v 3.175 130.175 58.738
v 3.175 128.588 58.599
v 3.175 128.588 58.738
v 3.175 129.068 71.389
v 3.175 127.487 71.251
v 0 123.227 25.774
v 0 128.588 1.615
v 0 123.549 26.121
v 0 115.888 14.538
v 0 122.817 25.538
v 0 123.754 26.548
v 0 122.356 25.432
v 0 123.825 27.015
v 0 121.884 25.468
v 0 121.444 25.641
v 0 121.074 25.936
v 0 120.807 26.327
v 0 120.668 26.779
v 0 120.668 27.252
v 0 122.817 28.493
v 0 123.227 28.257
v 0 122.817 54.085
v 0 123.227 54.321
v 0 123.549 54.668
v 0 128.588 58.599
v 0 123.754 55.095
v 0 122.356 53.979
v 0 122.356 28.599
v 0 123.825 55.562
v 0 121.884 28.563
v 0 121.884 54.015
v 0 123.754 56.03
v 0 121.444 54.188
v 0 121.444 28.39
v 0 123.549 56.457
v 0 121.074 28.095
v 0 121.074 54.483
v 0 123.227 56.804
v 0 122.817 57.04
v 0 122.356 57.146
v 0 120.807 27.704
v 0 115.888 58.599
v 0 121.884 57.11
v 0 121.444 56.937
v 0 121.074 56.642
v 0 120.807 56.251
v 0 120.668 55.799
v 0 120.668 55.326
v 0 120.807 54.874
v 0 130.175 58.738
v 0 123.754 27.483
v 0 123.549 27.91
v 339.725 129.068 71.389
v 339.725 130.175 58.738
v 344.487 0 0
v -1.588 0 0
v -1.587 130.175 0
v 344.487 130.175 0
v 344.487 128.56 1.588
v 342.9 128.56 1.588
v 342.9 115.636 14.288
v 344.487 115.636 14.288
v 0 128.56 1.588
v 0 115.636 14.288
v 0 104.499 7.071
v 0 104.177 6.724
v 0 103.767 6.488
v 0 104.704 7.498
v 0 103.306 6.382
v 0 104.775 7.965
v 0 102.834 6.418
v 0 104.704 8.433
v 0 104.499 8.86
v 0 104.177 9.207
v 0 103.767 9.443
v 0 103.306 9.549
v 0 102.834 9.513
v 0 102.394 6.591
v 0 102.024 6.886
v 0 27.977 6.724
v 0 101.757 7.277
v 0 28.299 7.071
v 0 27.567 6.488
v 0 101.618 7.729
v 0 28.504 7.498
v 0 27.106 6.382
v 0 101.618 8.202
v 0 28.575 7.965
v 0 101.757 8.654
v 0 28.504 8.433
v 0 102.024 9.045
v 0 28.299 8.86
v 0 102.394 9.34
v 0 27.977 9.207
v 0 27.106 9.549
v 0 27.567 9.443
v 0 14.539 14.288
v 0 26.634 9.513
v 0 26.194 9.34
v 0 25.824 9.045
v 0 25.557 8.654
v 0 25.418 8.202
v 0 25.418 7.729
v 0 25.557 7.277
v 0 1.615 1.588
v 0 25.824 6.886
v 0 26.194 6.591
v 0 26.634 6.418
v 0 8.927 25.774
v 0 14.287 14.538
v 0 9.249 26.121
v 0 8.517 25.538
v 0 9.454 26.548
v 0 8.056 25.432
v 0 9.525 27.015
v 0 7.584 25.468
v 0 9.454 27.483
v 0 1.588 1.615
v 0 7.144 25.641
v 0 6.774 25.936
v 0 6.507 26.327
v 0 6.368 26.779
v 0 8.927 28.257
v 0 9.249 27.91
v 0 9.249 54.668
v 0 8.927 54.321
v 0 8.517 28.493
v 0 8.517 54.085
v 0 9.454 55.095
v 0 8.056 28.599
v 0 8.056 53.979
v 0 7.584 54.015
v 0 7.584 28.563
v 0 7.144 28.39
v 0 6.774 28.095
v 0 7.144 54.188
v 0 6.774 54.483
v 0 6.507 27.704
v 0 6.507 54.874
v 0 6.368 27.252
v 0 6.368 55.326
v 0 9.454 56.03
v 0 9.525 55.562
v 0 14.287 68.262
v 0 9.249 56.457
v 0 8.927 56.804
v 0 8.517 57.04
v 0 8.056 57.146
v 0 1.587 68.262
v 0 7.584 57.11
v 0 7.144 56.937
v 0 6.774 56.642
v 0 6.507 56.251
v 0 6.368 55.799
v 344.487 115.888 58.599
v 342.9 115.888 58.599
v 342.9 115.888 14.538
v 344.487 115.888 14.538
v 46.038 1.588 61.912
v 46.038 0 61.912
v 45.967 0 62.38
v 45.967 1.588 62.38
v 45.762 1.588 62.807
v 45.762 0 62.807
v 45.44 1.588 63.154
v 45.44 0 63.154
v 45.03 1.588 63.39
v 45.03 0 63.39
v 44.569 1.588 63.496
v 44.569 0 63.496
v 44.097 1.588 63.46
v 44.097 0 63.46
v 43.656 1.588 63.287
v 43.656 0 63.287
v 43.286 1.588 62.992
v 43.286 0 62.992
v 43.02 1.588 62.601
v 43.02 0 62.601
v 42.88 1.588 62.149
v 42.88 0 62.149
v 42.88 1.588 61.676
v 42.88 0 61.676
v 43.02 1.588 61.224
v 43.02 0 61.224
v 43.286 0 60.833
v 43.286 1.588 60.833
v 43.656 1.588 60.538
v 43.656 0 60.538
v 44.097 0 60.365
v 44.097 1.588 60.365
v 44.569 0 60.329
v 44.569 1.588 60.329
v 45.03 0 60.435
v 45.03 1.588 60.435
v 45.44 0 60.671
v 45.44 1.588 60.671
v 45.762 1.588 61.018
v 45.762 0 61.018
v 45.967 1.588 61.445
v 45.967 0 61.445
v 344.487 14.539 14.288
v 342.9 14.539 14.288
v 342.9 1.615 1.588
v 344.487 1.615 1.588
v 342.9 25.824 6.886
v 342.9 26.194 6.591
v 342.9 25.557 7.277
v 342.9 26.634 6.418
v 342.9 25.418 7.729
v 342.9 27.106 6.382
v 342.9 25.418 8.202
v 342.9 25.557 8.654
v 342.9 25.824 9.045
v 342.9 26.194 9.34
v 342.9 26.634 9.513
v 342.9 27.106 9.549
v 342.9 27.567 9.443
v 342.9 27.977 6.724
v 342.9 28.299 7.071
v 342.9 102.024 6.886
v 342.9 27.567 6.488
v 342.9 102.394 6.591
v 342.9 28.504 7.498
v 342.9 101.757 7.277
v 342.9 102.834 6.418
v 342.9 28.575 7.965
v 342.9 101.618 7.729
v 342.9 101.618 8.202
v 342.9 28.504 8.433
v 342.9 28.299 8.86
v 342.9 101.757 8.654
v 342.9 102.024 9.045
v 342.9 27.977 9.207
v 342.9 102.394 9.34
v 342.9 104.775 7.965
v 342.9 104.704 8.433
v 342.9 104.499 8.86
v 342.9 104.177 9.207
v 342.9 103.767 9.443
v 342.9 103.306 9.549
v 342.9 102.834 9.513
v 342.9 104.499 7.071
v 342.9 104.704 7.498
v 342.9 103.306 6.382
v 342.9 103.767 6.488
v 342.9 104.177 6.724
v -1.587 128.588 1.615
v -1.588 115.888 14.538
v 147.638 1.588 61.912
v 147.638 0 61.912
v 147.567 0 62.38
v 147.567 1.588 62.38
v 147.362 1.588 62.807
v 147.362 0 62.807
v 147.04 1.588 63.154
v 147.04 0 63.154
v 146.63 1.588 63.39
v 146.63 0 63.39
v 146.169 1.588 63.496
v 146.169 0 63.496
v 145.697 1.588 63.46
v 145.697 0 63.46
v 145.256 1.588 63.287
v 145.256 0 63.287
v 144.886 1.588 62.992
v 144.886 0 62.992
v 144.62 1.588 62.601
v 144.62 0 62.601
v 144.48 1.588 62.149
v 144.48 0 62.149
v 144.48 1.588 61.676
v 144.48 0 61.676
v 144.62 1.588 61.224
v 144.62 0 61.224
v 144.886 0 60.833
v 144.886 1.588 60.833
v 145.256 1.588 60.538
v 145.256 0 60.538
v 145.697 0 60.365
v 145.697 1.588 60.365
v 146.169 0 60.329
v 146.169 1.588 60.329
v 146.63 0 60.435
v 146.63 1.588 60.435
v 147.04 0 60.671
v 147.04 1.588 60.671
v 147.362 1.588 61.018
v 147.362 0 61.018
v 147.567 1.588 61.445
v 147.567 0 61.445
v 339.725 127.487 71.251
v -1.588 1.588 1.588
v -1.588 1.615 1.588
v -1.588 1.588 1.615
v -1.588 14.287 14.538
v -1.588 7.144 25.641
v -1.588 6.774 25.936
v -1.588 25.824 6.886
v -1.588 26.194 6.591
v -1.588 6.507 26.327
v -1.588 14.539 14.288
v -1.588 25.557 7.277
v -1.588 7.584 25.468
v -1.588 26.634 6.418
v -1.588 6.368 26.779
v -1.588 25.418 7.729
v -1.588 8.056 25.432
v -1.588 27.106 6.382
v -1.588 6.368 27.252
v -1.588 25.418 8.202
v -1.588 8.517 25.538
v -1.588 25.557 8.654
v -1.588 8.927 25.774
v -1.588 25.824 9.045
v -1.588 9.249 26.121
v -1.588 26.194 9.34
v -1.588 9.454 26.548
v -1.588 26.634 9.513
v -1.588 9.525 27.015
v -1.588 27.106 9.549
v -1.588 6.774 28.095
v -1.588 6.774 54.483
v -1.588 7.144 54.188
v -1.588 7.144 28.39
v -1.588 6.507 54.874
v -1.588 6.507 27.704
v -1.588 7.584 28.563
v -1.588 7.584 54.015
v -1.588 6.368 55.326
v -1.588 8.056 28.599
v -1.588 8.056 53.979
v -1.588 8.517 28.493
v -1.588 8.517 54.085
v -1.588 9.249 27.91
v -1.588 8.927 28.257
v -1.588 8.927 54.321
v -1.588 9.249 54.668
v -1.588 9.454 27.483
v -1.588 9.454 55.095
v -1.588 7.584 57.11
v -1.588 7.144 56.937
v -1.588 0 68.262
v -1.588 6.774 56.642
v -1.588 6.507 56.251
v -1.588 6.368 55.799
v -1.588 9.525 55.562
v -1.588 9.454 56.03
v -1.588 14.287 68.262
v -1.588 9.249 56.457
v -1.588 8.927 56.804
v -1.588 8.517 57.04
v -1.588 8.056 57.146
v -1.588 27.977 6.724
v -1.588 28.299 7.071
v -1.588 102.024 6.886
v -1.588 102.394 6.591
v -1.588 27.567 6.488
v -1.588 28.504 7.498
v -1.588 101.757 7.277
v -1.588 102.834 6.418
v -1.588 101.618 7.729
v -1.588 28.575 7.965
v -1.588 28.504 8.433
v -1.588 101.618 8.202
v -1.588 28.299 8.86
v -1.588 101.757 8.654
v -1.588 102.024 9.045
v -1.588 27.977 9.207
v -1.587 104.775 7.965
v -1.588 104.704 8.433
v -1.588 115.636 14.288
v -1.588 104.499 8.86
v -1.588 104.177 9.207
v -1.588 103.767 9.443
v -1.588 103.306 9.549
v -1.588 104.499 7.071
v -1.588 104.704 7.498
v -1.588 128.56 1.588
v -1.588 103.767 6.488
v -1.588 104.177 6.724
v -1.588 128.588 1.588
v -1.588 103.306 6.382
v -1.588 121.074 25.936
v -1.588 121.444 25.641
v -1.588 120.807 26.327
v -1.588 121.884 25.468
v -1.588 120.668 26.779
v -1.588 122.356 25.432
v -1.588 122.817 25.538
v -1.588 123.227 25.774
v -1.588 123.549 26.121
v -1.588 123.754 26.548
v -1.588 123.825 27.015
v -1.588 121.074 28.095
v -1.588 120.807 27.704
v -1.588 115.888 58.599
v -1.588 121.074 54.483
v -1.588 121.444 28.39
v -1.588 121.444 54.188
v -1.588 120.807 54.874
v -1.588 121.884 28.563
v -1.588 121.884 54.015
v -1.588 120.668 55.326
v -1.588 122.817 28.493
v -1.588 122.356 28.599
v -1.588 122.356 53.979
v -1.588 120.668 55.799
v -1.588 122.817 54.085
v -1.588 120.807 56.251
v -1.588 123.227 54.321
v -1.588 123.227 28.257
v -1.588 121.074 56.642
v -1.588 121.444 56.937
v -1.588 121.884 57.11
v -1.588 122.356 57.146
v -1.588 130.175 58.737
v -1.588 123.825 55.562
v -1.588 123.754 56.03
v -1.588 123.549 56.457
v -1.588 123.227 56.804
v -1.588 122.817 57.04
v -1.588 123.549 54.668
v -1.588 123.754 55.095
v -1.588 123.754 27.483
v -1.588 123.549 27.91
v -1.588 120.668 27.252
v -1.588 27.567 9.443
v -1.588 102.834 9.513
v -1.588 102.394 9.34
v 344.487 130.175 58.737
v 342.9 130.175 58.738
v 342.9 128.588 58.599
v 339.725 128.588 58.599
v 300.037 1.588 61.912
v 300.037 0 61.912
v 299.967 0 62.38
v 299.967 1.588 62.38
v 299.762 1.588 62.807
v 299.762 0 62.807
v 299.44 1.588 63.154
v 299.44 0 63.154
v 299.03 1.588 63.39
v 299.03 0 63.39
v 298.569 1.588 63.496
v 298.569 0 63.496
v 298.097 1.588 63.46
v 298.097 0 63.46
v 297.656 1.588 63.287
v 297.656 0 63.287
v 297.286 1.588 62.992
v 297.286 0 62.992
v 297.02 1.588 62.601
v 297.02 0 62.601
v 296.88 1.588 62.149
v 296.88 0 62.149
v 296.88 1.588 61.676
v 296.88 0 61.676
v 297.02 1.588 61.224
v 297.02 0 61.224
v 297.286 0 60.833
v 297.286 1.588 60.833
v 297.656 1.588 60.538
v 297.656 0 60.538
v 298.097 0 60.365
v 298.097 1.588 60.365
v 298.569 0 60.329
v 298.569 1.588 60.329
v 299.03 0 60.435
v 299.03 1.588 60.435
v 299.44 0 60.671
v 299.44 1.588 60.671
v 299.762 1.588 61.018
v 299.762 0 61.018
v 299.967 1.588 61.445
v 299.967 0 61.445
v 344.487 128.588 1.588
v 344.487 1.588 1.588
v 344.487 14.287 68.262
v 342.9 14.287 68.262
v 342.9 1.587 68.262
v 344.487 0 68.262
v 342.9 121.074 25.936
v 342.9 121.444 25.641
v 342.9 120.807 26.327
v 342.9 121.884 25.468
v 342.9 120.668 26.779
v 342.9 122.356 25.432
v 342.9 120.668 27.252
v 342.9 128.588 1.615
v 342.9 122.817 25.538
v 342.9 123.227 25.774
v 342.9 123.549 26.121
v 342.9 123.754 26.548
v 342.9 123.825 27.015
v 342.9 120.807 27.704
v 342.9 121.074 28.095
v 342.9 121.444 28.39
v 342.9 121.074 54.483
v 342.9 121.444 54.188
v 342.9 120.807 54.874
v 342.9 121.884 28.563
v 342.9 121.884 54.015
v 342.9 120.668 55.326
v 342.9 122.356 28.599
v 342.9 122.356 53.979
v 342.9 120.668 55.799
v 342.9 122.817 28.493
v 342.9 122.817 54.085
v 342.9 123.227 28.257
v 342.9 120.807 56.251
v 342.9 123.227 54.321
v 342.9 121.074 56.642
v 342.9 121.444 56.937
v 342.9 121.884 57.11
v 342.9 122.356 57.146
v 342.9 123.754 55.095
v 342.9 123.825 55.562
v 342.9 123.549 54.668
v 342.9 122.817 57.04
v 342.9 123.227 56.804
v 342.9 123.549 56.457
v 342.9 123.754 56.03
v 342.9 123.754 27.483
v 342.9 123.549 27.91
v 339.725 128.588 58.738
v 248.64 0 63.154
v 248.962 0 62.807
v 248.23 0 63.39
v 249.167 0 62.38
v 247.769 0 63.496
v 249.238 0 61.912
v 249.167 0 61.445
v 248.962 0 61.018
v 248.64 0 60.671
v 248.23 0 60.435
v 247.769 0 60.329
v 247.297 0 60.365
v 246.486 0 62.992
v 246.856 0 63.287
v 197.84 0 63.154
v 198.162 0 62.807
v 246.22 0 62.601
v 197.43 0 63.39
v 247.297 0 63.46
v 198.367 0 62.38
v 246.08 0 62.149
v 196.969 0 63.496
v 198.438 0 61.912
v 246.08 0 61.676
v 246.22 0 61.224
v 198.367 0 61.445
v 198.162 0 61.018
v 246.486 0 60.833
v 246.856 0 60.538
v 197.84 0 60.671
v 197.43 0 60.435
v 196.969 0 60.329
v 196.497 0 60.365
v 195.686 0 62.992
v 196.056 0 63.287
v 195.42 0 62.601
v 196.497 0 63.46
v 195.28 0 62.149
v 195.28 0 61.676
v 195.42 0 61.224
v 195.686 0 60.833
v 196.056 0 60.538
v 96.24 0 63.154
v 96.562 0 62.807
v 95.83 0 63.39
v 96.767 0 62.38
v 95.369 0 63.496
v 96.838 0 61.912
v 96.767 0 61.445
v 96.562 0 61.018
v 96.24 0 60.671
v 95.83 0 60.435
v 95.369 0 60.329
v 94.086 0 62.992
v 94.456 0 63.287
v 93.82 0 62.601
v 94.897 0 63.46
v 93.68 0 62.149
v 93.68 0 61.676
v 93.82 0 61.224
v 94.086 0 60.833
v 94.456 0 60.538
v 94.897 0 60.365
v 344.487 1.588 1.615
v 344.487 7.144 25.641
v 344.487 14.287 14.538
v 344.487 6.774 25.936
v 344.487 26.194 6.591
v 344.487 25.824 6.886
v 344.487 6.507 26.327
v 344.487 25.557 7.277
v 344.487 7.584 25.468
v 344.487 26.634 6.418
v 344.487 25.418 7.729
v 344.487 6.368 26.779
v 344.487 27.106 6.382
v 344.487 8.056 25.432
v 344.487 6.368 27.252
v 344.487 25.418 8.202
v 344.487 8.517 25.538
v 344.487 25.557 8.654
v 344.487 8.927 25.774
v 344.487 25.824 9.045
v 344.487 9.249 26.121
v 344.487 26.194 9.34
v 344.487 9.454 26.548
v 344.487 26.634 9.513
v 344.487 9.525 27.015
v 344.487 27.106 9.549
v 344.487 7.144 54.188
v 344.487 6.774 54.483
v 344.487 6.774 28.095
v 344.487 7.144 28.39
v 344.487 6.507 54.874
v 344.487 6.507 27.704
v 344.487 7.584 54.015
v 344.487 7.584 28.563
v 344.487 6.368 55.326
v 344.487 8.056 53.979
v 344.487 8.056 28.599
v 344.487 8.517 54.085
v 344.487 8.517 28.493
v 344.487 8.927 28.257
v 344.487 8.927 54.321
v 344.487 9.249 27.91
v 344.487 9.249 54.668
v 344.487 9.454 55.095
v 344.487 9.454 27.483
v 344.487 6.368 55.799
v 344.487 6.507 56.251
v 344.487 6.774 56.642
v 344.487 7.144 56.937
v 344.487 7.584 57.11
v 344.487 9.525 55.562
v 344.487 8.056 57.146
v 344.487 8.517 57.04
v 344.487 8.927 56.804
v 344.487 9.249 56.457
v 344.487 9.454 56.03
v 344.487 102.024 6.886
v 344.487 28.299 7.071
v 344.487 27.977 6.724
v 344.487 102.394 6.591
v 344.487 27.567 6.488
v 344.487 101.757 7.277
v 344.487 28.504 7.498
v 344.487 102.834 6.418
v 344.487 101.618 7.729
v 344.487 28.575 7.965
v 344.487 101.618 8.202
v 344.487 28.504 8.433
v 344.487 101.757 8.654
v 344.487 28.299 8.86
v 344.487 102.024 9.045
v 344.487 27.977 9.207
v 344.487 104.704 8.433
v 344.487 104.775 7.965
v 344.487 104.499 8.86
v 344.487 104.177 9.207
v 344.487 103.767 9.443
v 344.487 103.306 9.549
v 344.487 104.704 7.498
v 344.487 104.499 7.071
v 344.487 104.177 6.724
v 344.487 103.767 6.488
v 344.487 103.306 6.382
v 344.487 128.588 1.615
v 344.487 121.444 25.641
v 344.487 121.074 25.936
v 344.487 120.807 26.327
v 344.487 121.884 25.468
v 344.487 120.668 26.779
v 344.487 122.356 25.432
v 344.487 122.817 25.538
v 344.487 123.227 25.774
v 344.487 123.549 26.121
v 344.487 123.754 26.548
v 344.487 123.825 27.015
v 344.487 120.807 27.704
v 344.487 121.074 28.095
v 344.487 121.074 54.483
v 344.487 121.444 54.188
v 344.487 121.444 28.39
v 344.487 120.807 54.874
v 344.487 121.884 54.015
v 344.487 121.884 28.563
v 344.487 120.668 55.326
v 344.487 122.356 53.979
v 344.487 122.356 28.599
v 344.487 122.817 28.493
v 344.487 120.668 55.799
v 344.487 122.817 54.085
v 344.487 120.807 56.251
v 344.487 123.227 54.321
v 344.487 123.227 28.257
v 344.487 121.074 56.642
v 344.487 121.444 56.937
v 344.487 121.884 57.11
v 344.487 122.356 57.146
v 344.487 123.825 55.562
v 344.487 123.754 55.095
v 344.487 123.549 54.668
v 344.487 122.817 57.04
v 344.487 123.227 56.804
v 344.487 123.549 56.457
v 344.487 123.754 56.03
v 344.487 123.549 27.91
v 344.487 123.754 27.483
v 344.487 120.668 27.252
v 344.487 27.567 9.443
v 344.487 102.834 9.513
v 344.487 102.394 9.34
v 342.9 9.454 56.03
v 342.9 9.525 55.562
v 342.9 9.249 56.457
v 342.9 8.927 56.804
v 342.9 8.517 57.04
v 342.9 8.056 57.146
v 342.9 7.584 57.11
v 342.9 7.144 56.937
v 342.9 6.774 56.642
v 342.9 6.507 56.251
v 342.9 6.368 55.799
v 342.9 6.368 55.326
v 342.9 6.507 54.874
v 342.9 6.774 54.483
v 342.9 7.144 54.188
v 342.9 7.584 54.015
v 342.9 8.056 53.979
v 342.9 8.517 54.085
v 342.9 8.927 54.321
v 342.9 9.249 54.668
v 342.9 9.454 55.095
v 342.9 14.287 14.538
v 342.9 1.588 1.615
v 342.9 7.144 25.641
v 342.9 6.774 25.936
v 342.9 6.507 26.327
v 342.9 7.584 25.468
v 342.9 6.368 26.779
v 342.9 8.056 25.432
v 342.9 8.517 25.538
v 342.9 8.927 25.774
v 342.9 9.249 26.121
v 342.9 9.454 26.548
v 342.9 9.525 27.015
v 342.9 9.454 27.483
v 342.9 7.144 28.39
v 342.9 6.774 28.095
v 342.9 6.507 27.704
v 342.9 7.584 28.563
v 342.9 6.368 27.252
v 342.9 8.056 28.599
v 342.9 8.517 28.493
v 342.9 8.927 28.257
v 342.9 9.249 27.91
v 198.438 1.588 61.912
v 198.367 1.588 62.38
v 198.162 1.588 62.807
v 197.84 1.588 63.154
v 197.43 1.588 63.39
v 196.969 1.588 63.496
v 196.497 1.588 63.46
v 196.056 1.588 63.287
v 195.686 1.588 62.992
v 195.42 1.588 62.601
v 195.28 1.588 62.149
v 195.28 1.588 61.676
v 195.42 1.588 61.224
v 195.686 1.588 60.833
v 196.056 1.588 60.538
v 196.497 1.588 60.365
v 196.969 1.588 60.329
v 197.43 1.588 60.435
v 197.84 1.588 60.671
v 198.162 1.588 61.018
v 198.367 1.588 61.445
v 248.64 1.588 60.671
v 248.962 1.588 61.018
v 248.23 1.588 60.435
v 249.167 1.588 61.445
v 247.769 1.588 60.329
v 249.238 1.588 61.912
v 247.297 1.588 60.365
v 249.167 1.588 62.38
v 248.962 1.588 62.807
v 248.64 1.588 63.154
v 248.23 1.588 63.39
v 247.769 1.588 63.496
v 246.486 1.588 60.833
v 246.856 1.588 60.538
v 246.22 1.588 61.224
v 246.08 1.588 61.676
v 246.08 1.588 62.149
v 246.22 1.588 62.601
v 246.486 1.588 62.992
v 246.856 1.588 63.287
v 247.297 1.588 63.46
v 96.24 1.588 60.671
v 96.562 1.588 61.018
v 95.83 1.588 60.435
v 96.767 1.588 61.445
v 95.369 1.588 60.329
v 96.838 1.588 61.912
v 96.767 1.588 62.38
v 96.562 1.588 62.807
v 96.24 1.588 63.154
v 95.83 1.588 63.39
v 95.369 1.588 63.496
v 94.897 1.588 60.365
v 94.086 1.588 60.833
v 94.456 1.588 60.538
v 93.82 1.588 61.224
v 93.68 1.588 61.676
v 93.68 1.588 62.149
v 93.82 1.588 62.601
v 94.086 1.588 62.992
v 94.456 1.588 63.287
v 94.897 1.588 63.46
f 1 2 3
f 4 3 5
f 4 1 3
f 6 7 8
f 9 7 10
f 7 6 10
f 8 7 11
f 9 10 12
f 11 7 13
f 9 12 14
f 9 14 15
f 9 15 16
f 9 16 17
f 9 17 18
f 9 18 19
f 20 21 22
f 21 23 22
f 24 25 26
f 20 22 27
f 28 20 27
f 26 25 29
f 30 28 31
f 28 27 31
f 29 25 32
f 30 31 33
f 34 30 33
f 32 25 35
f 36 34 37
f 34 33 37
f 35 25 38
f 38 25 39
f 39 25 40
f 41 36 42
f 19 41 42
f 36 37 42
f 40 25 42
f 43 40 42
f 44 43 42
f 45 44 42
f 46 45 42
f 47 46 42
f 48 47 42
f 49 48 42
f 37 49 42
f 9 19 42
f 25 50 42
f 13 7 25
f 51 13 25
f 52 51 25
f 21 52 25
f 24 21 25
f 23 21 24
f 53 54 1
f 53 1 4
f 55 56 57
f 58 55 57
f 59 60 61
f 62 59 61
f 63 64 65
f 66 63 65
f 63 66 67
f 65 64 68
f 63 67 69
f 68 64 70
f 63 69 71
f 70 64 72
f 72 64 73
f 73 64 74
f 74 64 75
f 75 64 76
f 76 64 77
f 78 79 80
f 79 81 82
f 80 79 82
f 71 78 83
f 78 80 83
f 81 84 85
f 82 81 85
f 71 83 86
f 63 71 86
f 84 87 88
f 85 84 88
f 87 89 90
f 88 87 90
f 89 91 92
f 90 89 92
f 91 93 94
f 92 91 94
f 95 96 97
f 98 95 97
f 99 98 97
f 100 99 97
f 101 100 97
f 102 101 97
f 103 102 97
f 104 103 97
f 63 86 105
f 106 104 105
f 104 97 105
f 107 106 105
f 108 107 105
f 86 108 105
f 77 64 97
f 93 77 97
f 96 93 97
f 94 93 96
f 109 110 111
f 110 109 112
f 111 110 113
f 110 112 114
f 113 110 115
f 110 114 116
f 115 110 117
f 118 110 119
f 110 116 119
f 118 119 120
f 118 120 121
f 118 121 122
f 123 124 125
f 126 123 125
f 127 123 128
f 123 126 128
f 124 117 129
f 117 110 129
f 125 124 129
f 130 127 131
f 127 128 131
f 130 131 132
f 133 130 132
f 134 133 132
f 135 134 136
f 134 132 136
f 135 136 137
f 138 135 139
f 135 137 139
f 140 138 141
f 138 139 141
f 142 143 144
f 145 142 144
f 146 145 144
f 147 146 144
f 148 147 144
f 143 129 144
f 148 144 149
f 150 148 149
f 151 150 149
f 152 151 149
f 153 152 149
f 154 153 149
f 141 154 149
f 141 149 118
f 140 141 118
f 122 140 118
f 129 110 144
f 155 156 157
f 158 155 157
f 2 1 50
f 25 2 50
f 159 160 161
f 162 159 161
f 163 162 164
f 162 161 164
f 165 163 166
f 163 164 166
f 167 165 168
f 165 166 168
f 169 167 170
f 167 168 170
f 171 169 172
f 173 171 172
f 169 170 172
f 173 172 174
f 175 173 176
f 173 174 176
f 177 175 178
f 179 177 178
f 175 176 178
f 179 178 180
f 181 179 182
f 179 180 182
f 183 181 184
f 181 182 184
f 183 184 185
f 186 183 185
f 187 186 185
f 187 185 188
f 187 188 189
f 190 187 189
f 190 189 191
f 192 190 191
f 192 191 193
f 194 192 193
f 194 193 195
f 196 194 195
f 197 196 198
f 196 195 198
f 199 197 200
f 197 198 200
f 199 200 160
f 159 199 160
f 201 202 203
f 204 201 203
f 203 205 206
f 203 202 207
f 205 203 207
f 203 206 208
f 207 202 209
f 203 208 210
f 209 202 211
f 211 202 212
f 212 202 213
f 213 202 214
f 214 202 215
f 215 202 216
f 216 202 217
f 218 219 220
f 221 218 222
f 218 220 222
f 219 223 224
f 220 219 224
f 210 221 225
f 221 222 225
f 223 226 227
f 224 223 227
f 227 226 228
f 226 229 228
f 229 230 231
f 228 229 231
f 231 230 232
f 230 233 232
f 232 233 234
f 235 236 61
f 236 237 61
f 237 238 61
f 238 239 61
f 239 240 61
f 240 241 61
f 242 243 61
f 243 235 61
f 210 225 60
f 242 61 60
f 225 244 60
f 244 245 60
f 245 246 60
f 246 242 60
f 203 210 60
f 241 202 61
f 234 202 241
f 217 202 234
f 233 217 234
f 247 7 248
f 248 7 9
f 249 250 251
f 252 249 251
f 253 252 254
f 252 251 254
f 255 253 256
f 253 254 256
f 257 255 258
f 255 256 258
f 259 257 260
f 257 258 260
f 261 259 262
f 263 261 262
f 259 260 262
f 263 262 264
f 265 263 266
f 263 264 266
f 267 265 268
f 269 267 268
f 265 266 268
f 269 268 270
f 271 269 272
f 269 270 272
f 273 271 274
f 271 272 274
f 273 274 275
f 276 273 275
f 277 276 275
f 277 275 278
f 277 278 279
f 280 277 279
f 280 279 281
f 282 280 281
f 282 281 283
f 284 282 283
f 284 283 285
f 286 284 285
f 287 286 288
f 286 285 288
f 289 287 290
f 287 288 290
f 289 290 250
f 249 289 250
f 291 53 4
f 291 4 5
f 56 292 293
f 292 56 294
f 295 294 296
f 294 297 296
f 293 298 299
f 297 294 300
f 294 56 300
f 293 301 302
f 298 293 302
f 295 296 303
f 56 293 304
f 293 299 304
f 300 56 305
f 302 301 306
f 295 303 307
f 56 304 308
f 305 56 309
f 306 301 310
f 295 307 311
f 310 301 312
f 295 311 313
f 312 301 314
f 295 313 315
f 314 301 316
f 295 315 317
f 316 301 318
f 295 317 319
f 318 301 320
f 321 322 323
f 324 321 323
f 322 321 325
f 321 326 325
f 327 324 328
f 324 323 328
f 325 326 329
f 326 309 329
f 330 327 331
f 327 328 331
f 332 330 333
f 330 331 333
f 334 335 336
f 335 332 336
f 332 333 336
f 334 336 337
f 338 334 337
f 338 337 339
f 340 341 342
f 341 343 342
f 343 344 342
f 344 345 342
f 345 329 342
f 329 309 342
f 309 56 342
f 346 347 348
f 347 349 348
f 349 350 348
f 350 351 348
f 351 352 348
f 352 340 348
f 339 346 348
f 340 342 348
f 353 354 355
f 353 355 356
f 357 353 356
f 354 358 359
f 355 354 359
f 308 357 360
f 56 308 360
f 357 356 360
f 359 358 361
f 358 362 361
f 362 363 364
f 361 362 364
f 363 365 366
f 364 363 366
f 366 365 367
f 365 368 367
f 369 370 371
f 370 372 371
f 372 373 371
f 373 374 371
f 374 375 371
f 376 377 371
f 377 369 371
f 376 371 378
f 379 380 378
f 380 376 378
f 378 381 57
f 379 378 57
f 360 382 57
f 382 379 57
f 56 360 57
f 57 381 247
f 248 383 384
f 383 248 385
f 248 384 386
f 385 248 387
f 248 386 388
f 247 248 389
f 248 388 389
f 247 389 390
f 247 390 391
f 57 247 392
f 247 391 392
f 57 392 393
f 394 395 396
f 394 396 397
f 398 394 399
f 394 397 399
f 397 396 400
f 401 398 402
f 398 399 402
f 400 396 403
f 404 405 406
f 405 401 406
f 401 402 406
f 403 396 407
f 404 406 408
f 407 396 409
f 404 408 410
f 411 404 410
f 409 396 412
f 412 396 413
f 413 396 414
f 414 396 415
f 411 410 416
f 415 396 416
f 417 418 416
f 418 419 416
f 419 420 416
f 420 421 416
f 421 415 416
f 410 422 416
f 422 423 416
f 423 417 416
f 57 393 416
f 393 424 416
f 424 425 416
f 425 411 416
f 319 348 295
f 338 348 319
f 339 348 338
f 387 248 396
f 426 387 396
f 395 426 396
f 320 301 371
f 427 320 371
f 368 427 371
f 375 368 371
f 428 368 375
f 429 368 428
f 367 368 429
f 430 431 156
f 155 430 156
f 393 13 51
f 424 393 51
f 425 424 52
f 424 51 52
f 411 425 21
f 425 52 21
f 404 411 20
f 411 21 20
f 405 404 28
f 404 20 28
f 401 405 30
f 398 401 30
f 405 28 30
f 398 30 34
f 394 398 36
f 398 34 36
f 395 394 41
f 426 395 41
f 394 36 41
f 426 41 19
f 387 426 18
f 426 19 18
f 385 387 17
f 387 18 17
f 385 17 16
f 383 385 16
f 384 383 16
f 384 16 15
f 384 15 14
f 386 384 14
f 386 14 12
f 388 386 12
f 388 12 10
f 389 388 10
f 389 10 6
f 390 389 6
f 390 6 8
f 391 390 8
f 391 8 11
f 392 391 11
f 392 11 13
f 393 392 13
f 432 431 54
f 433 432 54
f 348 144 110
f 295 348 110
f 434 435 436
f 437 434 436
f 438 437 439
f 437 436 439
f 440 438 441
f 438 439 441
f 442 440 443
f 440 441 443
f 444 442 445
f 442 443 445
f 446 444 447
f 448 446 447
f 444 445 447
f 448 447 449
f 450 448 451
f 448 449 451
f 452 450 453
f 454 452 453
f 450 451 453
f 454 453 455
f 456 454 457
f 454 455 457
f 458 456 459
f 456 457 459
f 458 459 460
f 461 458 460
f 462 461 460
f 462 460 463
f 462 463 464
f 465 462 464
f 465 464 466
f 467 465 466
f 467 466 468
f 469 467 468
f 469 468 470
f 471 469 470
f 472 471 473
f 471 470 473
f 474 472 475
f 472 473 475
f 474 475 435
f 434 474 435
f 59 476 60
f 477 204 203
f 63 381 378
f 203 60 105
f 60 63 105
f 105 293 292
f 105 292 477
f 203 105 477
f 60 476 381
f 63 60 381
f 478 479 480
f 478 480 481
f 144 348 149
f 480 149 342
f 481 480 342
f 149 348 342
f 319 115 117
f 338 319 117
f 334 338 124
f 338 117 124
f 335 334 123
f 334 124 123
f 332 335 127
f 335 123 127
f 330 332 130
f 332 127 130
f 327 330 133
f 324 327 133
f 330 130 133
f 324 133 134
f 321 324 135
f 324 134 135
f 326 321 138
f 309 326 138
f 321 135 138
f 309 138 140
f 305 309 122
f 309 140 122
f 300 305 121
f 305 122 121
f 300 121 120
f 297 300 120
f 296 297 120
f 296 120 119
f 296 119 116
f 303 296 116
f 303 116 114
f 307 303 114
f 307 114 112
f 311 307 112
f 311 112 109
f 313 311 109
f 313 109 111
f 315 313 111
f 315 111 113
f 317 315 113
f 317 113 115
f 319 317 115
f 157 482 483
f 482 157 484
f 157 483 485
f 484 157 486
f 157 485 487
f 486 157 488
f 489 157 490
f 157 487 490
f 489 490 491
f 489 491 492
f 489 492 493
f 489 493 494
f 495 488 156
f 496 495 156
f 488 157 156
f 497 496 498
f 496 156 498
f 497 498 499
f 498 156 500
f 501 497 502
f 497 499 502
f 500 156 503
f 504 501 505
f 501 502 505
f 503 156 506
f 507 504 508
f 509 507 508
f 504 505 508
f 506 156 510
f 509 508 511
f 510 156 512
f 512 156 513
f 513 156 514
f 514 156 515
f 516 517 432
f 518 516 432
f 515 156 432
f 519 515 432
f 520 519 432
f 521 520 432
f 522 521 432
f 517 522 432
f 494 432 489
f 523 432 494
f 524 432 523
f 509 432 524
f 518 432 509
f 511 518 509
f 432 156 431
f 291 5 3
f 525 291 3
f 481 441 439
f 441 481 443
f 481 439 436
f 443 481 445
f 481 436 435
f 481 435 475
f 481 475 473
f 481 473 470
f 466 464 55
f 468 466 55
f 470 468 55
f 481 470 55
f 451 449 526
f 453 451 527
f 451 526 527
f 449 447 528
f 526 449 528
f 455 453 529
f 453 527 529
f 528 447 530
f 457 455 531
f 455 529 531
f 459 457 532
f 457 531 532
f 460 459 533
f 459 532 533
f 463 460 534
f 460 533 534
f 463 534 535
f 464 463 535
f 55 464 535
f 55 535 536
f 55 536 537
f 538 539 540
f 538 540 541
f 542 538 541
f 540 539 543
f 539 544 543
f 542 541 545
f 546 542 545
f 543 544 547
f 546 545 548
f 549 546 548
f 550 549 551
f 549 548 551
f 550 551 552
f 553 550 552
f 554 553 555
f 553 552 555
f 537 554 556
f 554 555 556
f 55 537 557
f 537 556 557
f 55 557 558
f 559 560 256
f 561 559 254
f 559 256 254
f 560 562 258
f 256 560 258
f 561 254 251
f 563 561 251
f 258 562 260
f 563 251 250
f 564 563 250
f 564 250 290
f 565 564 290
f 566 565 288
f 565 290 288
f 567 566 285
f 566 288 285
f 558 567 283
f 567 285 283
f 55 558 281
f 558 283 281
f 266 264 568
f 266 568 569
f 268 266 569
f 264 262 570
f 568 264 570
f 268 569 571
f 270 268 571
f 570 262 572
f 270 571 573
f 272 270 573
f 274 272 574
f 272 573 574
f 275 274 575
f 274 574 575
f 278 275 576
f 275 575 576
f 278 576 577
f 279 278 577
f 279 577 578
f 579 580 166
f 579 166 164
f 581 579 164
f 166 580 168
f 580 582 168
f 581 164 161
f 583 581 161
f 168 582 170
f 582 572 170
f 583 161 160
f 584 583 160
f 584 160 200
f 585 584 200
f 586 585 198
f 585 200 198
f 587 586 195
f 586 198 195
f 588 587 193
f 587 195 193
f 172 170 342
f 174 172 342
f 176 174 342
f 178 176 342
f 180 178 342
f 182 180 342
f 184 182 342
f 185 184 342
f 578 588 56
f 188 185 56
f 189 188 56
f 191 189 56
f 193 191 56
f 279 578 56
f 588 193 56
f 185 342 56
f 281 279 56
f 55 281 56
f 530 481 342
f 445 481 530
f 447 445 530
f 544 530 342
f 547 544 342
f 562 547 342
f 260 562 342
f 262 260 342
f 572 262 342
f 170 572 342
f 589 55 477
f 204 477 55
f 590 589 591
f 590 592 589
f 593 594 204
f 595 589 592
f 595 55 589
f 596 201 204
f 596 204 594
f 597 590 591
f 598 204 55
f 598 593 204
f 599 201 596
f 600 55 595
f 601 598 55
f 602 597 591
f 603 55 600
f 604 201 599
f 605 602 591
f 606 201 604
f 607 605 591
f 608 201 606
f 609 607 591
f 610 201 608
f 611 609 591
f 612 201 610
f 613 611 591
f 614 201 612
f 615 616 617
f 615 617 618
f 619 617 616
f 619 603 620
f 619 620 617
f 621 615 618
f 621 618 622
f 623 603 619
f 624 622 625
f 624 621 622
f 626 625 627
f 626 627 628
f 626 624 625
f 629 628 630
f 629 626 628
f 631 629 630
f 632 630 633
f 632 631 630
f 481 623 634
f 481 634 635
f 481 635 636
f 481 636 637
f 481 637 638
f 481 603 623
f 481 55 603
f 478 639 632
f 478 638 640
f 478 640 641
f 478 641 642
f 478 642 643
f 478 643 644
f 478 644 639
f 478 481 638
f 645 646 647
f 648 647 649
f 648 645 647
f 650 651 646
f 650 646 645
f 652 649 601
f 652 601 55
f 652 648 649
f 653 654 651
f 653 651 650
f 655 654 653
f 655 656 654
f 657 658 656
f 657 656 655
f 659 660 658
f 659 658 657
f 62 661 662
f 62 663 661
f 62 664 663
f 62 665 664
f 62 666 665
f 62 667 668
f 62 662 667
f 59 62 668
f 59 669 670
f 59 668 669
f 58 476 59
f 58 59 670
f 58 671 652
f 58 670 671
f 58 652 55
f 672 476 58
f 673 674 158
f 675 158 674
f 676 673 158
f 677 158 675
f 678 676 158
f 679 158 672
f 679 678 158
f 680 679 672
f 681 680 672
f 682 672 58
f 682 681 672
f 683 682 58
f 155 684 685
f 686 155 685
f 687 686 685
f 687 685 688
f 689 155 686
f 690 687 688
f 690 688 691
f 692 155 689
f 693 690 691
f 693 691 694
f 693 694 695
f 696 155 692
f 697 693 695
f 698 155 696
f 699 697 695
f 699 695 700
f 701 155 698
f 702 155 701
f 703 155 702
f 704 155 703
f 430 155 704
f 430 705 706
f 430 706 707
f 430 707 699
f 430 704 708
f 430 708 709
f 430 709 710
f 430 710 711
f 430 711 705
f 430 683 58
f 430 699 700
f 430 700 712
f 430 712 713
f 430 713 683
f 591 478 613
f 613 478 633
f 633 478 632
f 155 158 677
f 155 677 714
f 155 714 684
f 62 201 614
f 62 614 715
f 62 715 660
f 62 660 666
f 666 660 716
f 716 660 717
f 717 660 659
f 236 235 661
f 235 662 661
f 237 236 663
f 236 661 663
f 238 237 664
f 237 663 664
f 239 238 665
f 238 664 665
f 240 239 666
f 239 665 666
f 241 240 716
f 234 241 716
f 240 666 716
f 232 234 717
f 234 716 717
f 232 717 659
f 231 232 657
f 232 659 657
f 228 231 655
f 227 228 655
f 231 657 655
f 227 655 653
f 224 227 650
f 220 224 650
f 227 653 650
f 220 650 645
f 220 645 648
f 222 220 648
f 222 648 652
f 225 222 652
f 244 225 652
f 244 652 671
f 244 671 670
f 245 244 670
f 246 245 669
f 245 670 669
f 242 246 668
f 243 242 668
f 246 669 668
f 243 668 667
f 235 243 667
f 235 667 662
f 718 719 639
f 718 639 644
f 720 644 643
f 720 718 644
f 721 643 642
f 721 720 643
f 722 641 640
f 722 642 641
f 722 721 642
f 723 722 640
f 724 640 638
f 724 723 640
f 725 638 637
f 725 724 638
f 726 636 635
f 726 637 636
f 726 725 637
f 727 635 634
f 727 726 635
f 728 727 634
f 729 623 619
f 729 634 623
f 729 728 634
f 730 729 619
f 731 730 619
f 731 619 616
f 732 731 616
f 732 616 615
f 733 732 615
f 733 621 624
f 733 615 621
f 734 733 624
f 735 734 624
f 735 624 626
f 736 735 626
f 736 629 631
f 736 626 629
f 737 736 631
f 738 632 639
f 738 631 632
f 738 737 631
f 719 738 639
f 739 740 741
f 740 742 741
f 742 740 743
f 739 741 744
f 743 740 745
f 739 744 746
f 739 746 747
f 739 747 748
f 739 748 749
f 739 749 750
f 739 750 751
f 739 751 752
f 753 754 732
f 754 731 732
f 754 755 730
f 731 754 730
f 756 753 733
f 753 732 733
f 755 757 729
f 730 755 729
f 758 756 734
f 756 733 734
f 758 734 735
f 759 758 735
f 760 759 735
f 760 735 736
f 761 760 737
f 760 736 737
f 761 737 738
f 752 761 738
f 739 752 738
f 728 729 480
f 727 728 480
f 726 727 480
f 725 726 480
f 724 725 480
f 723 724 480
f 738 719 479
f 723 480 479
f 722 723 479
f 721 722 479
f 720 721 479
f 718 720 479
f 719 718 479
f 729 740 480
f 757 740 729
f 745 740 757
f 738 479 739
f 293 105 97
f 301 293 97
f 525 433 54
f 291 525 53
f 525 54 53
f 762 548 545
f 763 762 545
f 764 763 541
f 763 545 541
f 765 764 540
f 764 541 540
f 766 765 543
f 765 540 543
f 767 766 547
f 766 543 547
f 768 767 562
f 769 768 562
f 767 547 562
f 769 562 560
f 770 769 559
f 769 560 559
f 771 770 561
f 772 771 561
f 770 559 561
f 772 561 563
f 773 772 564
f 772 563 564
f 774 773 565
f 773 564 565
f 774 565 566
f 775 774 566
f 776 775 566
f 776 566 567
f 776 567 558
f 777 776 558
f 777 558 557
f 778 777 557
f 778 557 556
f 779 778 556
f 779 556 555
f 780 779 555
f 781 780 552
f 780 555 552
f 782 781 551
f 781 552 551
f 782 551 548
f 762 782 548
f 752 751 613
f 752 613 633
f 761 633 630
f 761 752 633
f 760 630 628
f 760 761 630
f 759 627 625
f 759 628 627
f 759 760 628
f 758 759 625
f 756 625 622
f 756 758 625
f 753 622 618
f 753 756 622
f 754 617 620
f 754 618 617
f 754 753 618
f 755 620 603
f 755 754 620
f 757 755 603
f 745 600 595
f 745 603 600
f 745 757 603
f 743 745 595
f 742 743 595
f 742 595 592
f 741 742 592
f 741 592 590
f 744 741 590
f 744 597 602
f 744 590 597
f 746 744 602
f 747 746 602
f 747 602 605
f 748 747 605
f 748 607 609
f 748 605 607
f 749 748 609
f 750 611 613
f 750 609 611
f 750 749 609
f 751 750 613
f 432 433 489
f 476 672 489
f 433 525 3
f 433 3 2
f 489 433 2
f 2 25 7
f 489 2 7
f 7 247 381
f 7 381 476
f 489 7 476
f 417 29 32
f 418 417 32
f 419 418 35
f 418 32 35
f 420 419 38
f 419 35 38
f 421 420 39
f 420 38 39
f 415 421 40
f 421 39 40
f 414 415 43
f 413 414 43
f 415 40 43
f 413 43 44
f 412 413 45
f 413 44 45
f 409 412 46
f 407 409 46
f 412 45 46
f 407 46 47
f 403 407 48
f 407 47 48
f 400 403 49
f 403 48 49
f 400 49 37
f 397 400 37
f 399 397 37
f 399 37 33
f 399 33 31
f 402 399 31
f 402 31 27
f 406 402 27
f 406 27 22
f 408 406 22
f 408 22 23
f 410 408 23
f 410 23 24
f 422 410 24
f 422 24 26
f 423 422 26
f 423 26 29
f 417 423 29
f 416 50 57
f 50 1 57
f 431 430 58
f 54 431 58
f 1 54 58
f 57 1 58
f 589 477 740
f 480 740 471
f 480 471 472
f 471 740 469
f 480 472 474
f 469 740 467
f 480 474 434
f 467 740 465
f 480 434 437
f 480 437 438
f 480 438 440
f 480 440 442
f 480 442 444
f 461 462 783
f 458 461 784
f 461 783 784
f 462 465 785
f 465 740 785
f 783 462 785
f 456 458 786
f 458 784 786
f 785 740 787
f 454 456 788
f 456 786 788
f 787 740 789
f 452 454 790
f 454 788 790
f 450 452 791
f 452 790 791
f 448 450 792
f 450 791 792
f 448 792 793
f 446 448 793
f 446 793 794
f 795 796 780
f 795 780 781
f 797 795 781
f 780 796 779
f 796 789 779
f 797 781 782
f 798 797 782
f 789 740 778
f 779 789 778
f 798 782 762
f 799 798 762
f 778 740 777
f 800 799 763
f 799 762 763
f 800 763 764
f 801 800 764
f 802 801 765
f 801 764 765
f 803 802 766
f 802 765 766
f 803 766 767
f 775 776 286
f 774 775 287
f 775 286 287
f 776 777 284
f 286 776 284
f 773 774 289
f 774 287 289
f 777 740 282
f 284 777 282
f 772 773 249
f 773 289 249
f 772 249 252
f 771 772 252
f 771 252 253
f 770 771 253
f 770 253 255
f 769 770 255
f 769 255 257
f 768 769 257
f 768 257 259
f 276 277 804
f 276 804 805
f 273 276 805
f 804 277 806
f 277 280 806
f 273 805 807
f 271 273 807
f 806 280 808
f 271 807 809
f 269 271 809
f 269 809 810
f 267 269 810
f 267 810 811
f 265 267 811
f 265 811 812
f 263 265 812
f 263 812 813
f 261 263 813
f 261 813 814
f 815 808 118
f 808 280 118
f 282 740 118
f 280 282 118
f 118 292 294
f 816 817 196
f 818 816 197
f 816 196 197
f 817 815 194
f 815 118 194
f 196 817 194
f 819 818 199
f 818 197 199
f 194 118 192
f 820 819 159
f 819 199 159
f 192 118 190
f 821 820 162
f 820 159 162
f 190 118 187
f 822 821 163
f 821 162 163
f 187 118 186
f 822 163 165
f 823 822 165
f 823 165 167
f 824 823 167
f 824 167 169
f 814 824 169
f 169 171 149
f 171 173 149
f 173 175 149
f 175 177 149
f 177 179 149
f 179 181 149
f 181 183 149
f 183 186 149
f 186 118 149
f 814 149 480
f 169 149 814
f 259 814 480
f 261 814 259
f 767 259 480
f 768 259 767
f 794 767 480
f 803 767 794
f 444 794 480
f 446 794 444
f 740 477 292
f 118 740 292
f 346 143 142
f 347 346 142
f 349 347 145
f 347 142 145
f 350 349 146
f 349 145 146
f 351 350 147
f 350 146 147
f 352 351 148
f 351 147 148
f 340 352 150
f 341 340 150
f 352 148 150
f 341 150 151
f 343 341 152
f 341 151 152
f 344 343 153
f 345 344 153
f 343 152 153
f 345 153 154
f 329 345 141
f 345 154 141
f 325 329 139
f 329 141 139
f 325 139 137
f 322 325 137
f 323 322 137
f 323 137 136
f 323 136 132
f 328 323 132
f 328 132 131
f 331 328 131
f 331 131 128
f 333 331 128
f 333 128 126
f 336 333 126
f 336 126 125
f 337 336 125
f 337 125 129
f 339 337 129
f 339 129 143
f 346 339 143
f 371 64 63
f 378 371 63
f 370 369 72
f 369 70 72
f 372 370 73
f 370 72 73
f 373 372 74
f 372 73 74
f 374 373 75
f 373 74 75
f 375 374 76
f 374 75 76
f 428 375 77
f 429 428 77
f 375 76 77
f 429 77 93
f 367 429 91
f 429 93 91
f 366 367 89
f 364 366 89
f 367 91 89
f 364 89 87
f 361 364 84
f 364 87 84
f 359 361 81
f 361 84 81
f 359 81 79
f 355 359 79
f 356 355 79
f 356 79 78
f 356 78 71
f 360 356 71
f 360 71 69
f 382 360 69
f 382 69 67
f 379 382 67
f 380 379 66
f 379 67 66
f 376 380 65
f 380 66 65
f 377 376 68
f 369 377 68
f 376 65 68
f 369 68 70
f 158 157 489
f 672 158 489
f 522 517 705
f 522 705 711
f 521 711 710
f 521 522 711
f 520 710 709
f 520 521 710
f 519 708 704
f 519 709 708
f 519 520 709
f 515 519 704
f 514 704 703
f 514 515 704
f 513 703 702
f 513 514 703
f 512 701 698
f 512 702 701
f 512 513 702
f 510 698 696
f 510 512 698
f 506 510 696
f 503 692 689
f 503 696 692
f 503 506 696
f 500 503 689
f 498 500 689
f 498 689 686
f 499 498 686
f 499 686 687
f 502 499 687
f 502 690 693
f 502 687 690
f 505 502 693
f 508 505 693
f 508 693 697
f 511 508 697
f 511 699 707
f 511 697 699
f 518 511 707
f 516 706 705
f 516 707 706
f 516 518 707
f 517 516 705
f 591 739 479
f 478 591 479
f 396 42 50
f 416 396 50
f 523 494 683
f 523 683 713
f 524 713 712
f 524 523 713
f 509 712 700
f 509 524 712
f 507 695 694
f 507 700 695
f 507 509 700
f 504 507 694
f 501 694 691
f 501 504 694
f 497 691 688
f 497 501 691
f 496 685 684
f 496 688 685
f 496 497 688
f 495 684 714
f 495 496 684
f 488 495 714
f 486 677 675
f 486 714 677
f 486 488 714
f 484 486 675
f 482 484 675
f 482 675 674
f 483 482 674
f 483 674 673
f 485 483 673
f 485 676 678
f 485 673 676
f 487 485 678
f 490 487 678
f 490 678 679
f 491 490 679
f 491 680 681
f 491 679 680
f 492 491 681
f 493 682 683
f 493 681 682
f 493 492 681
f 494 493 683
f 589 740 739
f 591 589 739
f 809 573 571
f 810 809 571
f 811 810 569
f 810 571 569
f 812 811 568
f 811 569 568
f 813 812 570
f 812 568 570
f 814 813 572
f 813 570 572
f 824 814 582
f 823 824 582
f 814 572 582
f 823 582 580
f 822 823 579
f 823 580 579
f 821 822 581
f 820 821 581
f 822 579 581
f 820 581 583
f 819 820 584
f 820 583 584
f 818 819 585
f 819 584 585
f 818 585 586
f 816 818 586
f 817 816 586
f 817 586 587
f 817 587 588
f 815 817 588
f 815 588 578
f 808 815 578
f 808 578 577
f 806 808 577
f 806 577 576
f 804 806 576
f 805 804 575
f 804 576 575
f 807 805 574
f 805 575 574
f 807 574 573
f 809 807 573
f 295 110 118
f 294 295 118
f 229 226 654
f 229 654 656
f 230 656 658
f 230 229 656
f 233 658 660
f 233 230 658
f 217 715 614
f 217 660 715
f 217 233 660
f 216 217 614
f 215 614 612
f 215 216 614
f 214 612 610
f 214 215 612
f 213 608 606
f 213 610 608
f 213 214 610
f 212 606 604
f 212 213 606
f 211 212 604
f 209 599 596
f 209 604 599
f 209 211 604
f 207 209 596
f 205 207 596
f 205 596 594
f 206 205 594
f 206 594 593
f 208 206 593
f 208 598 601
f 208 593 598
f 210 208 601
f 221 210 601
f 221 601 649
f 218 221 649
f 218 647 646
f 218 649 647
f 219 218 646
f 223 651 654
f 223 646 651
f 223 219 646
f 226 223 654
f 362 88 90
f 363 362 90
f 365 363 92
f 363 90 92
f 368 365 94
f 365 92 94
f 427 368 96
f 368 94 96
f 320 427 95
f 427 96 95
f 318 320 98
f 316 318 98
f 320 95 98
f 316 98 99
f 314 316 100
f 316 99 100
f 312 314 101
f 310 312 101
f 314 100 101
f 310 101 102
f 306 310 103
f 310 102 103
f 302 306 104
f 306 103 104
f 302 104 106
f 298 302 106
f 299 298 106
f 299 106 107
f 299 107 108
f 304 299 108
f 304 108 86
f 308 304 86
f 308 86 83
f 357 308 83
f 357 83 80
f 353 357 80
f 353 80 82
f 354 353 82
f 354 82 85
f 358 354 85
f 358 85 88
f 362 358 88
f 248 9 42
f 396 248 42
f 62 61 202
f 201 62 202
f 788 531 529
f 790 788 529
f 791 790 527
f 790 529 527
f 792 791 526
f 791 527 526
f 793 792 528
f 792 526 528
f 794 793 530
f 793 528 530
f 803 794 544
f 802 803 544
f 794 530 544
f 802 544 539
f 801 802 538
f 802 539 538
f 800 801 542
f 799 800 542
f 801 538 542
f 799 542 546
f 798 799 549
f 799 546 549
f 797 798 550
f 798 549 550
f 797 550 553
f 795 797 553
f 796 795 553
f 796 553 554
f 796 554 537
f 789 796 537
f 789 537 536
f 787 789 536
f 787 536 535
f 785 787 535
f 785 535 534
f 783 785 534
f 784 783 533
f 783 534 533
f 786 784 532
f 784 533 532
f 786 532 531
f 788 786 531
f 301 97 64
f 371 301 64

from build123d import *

# Parameters (mm, degrees)
F1_DEPTH  = 342.9
F2_W      = 3.175
F2_H      = 12.7
F3_DEPTH  = 1.5945639921
F5_DEPTH  = 1.5875
F6_DEPTH  = 1.5875
F10_DEPTH = 1.5875
F11_R     = 1.5875
F12_DEPTH = 444.5
F13_R     = 1.5875
F14_DEPTH = 1.5875


# Not quite as in the source:
# - a feature names something its author has since deleted; it is built from what else it names


with BuildPart() as f1:
    # F0 (on Right) → F1 (new body)
    with BuildSketch(Plane.YZ):
        Polygon((0, 68.2625), (0, 0), (130.175, 0), (130.175, 58.7375), (129.0681220671, 71.3891726658), (127.4866629839, 71.2508129242), (128.5875, 58.7375), (128.5875, 1.5875), (1.5875, 1.5875), (1.5875, 68.2625), align=None)
    extrude(amount=F1_DEPTH)

    # F2 (on face) → F3 (cut, through all)
    with BuildSketch(Plane(origin=(0, 134.286004542, 11.7485030676), x_dir=(-1, 0, 0), z_dir=(0, 0.9961946981, 0.0871557427))):
        with Locations((-341.3125, 53.518487267)):
            Rectangle(F2_W, F2_H)
        with Locations((-1.5875, 53.518487267)):
            Rectangle(F2_W, F2_H)
    extrude(amount=-F3_DEPTH, mode=Mode.SUBTRACT)

    # F4 (on face) → F5 (join)
    with BuildSketch(Plane(origin=(0, 0, 0), x_dir=(0, -1, 0), z_dir=(-1, 0, 0))):
        Polygon((-128.5875, 58.5986117467), (-130.175, 58.7375), (-130.175, 0), (-128.5875, 1.6154517363), align=None)
        Polygon((-115.8881750797, 58.5986117466), (-130.175, 58.7375), (-128.5875, 58.5986117467), (-128.5875, 1.6154517363), (-115.8881750797, 14.538378661), align=None)
        Polygon((-115.6359343729, 14.2875), (-128.5595482637, 1.5875), (-1.6154517363, 1.5875), (-14.5390656271, 14.2875), align=None)
        Polygon((-14.2868249203, 14.538378661), (-1.5875, 1.6154517363), (-1.5875, 68.2625), (-14.2868249203, 68.2625), (-14.2868249203, 58.5986117466), align=None)
    extrude(amount=F5_DEPTH)


with BuildPart() as f6:
    # F6 (new): a face of the model
    f6_faces = [f1.part.faces().sort_by_distance(p)[0] for p in [
        (0, 129.2764111618, 0.7047010288),
    ]]
    extrude(f6_faces, amount=F6_DEPTH)


with BuildPart() as f1_1:
    add(f1.part)

    # F7: union F6
    add(f6.part)

    # F9 (on face) + F8 (on face) → F10 (join)
    with BuildSketch(Plane.YZ.offset(342.9)):
        Polygon((1.5875, 68.2625), (1.5875, 1.6154517363), (14.2868249203, 14.538378661), (14.2868249203, 58.5986117466), (14.2868249203, 68.2625), align=None)
        Polygon((115.8881750797, 14.538378661), (128.5875, 1.6154517363), (128.5875, 58.5986117467), (130.175, 58.7375), (115.8881750797, 58.5986117466), align=None)
        Polygon((128.5875, 1.6154517363), (130.175, 0), (130.175, 58.7375), (128.5875, 58.5986117467), align=None)
        Polygon((14.5390656271, 14.2875), (1.6154517363, 1.5875), (128.5595482637, 1.5875), (115.6359343729, 14.2875), align=None)
    with BuildSketch(Plane.YZ.offset(342.9)):
        Polygon((128.5875, 58.5986117467), (128.5875, 1.5875), (1.5875, 1.5875), (1.5875, 68.2625), (0, 68.2625), (0, 0), (130.175, 0), (130.175, 58.7375), align=None)
    extrude(amount=F10_DEPTH)

    # F11 (on face) → F12 (cut, symmetric)
    with BuildSketch(Plane.YZ):
        with Locations((7.9375, 55.5625)):
            Circle(F11_R)
        with Locations((7.9375, 27.0154517363)):
            Circle(F11_R)
        with Locations((26.9875, 7.9654517363)):
            Circle(F11_R)
        with Locations((122.2375, 55.5625)):
            Circle(F11_R)
        with Locations((122.2375, 27.0154517363)):
            Circle(F11_R)
        with Locations((103.1875, 7.9654517363)):
            Circle(F11_R)
    extrude(amount=F12_DEPTH, both=True, mode=Mode.SUBTRACT)

    # F13 (on face) → F14 (cut, through all)
    with BuildSketch(Plane.XZ):
        with Locations((44.45, 61.9125)):
            Circle(F13_R)
        with Locations((95.25, 61.9125)):
            Circle(F13_R)
        with Locations((146.05, 61.9125)):
            Circle(F13_R)
        with Locations((196.85, 61.9125)):
            Circle(F13_R)
        with Locations((247.65, 61.9125)):
            Circle(F13_R)
        with Locations((298.45, 61.9125)):
            Circle(F13_R)
    extrude(amount=-F14_DEPTH, mode=Mode.SUBTRACT)


solid = f1_1.part
